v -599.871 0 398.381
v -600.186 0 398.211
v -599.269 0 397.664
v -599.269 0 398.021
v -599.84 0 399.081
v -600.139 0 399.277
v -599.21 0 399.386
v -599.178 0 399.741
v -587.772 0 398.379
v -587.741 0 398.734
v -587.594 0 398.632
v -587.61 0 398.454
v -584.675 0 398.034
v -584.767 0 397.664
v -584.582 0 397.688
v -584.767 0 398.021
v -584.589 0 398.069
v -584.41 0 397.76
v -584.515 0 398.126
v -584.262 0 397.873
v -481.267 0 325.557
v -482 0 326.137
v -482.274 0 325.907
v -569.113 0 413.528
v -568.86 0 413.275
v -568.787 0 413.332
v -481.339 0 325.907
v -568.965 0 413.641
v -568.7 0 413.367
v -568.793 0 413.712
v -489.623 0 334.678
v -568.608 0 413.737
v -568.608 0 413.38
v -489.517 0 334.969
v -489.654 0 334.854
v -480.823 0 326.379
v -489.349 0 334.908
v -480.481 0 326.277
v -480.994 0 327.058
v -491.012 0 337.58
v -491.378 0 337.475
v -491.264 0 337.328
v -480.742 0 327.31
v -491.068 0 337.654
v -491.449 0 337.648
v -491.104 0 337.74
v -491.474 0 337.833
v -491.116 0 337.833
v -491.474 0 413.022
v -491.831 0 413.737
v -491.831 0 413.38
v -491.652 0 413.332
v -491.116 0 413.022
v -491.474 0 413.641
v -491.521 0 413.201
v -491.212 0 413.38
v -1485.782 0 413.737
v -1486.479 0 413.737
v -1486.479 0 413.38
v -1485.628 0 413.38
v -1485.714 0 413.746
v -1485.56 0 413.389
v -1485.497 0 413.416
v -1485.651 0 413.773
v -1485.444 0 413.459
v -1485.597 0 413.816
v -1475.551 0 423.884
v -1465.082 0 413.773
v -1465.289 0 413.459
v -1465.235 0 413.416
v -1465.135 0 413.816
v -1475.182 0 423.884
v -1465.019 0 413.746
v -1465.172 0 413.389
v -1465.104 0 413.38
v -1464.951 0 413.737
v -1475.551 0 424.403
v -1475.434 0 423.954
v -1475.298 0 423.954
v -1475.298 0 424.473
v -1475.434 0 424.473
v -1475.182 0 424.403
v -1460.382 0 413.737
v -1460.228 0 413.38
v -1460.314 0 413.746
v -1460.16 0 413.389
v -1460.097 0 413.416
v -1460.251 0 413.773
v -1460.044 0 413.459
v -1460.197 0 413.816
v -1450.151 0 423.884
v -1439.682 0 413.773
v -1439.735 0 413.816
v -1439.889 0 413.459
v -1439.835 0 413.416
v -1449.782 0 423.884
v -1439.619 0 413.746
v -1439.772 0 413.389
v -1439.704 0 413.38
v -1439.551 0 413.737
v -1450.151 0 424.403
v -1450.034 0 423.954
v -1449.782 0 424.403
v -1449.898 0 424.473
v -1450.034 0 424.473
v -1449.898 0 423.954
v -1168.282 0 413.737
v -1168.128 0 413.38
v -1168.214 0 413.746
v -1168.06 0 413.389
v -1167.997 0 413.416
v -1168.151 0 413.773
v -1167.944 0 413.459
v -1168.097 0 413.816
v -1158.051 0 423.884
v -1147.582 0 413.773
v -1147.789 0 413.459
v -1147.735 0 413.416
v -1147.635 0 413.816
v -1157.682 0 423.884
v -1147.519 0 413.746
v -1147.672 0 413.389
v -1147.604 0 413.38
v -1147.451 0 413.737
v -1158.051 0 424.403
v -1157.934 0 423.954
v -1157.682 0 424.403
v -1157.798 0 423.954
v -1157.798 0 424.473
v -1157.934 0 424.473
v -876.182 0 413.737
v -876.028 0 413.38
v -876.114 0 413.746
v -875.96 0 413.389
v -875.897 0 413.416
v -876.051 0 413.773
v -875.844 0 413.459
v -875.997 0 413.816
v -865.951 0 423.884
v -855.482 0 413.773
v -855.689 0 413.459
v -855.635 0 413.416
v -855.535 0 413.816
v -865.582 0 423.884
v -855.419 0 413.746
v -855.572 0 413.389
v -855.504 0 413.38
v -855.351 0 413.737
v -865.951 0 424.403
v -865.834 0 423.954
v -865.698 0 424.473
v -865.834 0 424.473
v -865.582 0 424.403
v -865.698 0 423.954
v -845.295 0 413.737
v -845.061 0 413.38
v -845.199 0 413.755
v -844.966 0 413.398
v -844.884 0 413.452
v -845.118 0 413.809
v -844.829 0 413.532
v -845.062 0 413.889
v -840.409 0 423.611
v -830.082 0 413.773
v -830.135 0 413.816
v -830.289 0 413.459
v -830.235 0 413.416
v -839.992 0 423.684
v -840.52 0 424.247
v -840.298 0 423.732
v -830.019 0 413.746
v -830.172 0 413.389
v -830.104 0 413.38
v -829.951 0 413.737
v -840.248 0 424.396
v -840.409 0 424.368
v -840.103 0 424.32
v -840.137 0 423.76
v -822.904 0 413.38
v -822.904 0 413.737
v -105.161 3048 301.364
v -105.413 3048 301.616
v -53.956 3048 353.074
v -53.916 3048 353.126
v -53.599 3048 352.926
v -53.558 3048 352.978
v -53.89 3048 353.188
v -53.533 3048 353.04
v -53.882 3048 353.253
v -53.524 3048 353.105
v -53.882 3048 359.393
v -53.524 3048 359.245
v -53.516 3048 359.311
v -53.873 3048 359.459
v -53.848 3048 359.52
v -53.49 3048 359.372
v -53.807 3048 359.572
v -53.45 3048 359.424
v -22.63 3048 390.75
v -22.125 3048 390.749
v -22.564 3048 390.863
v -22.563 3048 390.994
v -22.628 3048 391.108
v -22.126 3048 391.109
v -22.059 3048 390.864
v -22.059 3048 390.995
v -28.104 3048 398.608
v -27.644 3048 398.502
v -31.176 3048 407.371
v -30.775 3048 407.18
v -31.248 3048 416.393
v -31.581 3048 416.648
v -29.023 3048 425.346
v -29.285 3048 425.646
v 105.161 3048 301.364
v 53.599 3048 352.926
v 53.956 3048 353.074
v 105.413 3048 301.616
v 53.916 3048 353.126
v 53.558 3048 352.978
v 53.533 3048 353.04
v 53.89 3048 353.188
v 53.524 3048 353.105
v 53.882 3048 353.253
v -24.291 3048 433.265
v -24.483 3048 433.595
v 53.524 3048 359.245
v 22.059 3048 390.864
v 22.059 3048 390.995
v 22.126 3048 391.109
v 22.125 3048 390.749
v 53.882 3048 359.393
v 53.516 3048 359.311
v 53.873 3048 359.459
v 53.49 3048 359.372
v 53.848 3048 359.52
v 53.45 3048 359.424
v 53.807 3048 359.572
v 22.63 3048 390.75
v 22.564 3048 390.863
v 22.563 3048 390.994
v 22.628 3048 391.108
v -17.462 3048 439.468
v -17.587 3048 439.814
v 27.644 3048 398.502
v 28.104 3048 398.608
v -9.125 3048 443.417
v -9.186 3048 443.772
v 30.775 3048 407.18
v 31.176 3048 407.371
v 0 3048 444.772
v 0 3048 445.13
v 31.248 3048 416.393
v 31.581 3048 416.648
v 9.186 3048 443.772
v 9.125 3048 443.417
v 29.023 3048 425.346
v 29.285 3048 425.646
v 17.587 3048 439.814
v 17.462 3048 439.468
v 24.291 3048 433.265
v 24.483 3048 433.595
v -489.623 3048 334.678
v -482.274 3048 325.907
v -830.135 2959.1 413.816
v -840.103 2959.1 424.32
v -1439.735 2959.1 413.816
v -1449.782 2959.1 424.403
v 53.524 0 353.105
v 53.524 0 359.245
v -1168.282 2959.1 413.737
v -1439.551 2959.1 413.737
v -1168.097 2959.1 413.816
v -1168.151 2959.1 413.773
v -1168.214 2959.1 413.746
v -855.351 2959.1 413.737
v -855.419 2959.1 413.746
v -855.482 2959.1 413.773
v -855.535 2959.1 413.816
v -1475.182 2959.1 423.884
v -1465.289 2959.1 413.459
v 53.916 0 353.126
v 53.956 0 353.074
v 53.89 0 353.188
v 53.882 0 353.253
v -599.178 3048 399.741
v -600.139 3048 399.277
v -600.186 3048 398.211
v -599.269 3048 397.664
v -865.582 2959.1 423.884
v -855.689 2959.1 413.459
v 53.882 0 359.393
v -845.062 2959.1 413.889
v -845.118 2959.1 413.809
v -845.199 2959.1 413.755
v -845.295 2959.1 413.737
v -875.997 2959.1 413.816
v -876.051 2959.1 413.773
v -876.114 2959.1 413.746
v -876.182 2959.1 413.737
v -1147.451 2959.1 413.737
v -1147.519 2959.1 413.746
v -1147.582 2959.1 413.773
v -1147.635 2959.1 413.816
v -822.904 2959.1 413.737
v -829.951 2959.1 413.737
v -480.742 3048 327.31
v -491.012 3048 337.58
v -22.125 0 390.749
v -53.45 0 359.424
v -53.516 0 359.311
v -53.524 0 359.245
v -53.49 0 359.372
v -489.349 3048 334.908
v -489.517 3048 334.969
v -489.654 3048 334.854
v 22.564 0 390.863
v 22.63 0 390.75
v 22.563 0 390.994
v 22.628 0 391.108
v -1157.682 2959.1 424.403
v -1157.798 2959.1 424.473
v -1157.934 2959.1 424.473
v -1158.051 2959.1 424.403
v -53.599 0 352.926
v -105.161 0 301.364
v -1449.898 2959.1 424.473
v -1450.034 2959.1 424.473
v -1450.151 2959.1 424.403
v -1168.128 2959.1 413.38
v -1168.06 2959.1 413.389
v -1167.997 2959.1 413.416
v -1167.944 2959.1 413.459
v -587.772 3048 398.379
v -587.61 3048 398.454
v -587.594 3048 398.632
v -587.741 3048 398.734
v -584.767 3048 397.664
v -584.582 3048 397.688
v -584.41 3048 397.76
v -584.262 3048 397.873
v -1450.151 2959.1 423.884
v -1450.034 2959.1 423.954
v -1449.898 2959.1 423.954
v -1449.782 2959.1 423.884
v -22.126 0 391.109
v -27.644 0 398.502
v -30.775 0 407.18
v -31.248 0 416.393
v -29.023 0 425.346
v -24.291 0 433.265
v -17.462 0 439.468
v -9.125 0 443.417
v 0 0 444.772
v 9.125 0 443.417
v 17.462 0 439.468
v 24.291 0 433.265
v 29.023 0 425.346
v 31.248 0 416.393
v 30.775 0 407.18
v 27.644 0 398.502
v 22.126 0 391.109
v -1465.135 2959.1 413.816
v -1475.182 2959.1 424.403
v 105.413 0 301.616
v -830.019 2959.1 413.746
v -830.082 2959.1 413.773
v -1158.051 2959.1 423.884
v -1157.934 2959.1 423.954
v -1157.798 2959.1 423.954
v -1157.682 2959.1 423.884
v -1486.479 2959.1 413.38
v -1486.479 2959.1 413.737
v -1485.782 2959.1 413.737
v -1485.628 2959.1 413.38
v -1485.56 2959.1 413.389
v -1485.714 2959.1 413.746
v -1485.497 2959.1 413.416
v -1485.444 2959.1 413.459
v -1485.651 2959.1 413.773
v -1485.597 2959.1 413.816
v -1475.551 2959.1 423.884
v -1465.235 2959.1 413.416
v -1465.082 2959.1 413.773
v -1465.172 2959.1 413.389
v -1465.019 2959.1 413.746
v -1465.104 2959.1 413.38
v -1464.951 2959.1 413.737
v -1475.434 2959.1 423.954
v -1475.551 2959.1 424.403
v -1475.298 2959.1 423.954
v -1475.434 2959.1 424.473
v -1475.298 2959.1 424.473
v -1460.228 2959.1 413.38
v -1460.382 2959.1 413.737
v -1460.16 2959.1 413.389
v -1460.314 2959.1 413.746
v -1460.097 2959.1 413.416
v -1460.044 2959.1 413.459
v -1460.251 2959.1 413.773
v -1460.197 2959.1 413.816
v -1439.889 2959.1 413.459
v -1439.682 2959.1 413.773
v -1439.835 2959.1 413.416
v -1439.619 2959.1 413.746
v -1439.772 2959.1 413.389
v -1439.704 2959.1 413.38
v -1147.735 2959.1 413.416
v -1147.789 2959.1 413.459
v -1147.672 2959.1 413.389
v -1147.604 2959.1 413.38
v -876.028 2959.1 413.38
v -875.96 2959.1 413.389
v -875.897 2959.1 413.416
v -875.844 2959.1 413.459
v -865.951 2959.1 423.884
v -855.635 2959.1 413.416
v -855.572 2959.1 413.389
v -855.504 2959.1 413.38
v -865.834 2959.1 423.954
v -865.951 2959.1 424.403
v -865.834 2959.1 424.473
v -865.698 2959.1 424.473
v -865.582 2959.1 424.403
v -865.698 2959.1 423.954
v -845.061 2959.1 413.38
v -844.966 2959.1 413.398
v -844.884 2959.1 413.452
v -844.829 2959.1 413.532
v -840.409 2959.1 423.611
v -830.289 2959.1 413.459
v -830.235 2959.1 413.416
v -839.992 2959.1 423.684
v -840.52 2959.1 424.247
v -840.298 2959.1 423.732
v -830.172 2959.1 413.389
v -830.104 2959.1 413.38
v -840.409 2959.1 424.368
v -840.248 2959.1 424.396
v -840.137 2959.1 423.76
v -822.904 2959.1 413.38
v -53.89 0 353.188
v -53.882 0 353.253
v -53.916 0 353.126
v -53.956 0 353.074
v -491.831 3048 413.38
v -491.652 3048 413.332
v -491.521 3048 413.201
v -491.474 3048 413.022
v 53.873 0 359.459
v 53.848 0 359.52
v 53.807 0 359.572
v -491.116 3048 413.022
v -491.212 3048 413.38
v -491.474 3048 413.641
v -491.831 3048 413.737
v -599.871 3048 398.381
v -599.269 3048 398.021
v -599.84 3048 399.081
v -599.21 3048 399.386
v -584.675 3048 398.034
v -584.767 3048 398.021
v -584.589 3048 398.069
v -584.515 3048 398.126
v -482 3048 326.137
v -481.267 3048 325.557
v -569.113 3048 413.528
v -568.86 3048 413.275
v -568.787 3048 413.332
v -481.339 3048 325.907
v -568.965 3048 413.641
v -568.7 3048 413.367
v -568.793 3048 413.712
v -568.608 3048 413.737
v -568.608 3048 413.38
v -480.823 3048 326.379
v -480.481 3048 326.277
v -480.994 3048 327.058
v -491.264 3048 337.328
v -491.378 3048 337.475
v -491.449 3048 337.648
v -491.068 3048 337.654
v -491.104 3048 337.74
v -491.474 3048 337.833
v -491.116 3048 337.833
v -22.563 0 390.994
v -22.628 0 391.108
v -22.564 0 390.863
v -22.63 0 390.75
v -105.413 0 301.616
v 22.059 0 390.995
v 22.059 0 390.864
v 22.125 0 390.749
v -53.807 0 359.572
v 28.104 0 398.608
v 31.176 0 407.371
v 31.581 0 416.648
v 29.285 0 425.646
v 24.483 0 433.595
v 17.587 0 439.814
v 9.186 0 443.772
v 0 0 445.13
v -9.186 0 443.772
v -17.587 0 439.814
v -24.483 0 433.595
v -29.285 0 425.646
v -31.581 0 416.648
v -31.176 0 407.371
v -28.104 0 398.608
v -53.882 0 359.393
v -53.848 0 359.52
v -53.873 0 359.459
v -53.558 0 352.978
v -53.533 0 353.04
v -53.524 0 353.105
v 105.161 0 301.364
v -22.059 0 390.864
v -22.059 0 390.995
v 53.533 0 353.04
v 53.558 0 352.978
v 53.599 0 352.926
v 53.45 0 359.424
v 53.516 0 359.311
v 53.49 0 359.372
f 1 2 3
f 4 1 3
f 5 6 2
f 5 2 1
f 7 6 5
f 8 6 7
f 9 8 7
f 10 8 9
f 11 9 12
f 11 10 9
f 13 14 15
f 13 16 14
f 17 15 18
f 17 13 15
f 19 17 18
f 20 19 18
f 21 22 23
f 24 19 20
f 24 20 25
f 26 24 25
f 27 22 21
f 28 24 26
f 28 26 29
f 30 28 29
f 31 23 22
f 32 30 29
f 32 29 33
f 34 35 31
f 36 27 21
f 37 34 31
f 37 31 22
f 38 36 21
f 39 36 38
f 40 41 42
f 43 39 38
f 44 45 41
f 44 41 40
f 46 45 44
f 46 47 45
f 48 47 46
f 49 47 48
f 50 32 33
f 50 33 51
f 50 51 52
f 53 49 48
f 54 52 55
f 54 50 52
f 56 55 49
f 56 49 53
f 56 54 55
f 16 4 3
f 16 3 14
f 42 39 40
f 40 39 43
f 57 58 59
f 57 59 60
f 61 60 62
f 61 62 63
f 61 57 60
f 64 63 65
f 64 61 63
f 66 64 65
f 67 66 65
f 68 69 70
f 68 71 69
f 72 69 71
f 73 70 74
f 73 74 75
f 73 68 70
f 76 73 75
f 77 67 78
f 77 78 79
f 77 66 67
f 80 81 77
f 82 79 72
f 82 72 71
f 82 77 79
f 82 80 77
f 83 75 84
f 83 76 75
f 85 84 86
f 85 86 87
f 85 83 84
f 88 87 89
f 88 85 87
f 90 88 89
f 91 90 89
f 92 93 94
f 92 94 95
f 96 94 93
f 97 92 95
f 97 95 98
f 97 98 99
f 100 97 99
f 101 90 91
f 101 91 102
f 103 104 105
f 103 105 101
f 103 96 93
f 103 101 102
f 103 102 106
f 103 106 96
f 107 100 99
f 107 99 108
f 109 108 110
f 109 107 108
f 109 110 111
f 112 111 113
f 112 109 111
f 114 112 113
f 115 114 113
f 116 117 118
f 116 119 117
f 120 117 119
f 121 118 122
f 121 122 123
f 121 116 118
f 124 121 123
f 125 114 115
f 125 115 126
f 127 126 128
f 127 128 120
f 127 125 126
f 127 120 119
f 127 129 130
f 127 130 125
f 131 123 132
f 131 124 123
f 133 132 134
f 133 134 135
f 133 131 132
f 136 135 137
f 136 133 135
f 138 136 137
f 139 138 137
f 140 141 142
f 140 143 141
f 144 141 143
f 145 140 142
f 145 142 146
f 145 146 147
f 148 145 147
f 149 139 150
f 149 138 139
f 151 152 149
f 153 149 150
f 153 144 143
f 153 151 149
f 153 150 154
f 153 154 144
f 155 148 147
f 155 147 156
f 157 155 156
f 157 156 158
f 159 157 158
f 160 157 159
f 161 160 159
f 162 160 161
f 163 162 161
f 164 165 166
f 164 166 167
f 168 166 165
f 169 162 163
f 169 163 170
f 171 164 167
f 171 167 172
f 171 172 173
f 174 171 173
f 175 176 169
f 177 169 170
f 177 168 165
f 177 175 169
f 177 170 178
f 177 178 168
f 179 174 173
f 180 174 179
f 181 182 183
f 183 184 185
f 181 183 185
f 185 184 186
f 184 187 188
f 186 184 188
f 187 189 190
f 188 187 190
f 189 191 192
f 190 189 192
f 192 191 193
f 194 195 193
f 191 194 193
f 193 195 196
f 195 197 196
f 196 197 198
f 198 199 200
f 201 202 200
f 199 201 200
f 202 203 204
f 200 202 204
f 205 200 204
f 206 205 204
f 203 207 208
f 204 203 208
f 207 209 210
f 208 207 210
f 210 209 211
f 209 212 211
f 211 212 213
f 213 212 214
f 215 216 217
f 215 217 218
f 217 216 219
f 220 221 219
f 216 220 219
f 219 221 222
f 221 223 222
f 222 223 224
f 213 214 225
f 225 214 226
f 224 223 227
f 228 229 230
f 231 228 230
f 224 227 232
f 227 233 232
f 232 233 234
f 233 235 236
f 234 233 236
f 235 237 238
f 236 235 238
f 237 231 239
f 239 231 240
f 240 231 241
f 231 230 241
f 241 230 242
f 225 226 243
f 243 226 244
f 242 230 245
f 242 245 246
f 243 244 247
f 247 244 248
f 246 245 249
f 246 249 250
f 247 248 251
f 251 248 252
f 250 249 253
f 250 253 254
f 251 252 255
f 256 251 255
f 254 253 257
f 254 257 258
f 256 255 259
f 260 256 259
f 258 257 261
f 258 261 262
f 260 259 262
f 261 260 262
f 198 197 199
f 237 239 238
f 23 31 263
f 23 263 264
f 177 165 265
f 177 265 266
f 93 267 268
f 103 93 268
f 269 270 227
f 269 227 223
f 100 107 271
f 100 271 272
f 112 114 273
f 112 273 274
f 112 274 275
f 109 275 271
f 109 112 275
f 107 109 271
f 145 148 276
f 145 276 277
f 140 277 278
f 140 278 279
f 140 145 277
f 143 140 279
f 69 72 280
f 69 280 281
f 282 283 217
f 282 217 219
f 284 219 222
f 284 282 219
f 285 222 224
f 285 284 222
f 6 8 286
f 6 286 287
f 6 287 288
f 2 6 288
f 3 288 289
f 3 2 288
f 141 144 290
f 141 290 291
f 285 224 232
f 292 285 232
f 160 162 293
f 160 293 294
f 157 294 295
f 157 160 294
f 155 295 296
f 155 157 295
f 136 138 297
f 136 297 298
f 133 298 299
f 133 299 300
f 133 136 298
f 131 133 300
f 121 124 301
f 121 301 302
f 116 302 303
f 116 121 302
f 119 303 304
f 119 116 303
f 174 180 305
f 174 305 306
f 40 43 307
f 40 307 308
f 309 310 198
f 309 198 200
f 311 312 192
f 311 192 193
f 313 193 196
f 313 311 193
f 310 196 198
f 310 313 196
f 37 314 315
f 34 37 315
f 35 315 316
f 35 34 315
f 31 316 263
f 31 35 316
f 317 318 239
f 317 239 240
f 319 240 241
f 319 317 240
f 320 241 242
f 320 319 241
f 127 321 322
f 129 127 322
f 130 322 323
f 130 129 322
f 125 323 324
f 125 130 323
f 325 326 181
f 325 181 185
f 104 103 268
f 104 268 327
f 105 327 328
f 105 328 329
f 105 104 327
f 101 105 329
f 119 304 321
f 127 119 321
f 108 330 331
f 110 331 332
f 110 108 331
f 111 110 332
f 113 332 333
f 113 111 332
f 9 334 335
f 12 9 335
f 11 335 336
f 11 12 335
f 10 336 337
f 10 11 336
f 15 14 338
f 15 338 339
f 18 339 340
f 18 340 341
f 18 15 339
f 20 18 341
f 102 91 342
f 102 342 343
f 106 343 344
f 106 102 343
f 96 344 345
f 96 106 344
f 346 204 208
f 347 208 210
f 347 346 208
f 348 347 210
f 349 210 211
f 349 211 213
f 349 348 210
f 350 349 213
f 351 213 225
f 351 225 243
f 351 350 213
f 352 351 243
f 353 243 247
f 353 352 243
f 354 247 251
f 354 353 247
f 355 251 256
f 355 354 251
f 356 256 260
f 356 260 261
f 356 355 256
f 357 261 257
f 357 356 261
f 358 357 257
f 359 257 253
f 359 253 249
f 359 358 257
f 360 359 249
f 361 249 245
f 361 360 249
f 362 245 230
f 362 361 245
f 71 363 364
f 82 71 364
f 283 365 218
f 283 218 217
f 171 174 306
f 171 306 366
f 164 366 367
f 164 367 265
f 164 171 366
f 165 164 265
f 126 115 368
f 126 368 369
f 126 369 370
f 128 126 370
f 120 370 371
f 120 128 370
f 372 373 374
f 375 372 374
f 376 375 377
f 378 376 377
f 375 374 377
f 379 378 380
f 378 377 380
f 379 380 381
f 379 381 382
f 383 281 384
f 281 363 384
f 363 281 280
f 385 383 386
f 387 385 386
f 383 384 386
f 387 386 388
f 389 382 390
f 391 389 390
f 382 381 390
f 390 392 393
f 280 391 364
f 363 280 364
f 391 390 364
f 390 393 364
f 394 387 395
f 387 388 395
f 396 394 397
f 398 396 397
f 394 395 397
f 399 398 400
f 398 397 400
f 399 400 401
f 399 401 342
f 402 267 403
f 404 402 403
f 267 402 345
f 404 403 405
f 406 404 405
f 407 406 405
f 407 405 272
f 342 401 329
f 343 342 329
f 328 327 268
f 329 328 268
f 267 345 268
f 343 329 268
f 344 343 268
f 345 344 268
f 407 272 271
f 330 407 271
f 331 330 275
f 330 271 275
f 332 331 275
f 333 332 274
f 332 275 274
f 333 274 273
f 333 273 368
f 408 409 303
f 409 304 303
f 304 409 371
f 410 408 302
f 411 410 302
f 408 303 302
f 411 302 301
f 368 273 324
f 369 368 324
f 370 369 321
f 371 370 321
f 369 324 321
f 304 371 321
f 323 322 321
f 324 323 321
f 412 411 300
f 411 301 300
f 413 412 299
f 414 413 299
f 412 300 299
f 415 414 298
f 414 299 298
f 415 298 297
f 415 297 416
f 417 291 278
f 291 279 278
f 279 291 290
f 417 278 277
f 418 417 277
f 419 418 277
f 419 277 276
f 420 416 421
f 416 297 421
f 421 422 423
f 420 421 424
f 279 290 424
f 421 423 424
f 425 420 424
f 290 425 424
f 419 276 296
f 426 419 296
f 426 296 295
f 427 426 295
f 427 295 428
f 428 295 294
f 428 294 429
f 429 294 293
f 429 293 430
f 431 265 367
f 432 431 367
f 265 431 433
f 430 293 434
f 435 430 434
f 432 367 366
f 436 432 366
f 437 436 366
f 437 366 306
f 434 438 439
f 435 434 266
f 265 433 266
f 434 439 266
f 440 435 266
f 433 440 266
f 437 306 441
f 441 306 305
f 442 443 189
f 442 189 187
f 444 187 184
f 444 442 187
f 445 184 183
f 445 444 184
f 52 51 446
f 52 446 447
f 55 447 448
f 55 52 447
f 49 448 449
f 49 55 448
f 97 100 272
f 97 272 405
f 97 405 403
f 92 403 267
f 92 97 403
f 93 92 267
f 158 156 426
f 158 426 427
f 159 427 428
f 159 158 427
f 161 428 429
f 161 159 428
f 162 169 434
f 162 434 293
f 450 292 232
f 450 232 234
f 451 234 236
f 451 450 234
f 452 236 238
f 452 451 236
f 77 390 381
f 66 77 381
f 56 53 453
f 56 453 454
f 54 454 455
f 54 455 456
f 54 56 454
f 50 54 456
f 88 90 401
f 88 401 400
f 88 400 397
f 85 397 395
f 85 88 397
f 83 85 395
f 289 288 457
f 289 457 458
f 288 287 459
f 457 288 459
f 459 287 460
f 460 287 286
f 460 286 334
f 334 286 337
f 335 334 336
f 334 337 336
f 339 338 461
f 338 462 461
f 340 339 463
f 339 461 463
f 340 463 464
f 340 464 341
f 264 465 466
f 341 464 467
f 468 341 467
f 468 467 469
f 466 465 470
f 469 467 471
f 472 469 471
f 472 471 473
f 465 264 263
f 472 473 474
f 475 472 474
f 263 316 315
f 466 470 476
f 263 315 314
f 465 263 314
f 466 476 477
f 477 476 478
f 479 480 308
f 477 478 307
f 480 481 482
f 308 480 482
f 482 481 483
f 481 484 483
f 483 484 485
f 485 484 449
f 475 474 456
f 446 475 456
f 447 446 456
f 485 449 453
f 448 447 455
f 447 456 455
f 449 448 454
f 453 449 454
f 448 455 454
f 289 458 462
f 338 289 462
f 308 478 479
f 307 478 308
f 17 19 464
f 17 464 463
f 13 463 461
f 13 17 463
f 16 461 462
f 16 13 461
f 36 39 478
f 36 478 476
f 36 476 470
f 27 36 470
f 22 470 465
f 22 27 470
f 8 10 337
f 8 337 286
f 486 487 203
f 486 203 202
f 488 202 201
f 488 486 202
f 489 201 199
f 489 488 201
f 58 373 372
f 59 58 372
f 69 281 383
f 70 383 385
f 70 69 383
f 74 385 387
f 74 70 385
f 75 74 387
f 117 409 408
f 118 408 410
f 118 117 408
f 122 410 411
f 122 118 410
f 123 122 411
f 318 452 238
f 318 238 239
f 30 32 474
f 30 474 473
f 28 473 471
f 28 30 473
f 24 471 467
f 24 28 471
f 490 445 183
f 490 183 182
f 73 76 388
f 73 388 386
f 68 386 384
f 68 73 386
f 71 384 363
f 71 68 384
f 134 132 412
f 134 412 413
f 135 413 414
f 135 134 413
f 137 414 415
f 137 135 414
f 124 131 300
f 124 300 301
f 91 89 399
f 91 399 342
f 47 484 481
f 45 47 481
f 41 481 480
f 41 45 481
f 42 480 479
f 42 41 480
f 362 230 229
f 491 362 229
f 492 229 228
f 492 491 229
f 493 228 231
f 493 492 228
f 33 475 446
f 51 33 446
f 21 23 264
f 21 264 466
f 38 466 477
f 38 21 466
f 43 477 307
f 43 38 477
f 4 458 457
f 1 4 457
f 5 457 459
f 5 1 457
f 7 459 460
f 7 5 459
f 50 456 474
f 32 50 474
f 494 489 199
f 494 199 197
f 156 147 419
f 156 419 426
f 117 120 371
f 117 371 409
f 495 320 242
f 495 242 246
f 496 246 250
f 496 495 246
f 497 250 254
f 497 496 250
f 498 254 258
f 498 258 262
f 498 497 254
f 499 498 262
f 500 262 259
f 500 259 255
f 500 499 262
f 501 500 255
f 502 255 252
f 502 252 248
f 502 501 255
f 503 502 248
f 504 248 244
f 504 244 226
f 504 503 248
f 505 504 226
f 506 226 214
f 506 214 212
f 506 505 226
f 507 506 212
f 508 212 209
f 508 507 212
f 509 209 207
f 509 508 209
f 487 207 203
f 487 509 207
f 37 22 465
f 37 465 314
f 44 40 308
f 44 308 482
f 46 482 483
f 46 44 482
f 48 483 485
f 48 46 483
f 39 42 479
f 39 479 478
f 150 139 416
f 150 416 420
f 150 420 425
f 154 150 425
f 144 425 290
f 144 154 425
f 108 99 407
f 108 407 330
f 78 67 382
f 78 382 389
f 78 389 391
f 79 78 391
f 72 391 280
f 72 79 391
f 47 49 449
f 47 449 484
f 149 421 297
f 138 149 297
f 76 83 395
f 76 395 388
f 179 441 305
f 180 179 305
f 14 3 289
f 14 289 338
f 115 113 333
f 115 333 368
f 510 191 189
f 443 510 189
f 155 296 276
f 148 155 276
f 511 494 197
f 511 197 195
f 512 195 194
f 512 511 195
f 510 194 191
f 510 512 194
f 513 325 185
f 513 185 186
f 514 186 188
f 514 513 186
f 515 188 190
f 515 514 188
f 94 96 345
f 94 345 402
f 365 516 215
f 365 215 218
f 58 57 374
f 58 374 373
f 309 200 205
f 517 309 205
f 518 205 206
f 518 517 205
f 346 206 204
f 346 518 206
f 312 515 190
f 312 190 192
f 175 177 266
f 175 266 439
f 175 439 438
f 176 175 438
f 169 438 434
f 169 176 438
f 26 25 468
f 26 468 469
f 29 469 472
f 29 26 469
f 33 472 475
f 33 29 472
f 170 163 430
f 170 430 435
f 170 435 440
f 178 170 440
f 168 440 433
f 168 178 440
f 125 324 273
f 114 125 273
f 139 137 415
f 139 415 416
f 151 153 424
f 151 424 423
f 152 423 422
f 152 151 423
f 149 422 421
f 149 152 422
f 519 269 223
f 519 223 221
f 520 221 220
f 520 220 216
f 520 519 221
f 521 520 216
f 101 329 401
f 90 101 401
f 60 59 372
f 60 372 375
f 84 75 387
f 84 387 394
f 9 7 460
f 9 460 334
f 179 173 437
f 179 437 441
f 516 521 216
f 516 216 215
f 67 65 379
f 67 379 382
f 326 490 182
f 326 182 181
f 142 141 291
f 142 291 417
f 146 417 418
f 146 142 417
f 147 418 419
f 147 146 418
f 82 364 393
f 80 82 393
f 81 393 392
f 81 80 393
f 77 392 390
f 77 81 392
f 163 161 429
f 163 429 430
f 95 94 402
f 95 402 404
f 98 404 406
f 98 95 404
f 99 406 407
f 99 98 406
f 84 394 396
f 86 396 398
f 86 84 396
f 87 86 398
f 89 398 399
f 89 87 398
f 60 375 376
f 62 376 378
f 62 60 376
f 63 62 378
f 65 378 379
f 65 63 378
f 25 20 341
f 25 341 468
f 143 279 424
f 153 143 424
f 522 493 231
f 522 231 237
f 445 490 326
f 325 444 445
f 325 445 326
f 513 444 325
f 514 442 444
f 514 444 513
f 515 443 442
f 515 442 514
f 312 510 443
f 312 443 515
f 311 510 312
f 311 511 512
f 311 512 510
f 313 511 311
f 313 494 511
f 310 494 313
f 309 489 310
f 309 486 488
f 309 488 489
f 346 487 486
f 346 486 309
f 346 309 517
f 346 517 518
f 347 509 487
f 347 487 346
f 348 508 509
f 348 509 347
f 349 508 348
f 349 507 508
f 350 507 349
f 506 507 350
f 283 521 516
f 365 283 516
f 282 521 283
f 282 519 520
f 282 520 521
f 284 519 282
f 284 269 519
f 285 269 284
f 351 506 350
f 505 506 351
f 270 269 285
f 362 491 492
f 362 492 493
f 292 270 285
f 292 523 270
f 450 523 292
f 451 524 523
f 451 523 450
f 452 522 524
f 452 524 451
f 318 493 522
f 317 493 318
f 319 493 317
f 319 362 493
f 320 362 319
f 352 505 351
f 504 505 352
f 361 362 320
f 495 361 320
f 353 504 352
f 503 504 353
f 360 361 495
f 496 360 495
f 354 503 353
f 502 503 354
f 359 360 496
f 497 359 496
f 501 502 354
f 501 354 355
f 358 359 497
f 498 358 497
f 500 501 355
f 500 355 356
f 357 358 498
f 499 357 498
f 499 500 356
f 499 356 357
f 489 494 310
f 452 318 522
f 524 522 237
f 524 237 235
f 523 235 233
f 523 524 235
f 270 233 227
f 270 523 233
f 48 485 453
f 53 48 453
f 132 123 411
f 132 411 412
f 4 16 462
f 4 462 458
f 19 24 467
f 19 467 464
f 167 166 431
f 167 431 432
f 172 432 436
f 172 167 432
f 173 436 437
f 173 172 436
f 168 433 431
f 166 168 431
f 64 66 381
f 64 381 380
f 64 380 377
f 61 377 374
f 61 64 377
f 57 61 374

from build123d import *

# Parameters (mm, degrees)
F1_DEPTH = 2959.1
F2_DEPTH = 3048
F3_DEPTH = 3048


with BuildPart() as f1:
    # F0 (on Front) → F1 (new body)
    with BuildSketch(Plane.XZ):
        with BuildLine():
            Line((-1475.550572, 424.403133), (-1485.597445, 413.815938))
            ThreePointArc((-1485.597445, 413.815938), (-1485.681425, 413.757407), (-1485.78169, 413.73678))
            Line((-1485.78169, 413.73678), (-1486.478827, 413.73678))
            Line((-1486.478827, 413.73678), (-1486.478827, 413.37958))
            Line((-1486.478827, 413.37958), (-1485.628242, 413.37958))
            ThreePointArc((-1485.628242, 413.37958), (-1485.527978, 413.400207), (-1485.443997, 413.458738))
            Line((-1485.443997, 413.458738), (-1475.550572, 423.884232))
            ThreePointArc((-1475.550572, 423.884232), (-1475.366327, 423.96339), (-1475.182082, 423.884232))
            Line((-1475.182082, 423.884232), (-1465.288657, 413.458738))
            ThreePointArc((-1465.288657, 413.458738), (-1465.204677, 413.400207), (-1465.104412, 413.37958))
            Line((-1465.104412, 413.37958), (-1460.228242, 413.37958))
            ThreePointArc((-1460.228242, 413.37958), (-1460.127978, 413.400207), (-1460.043997, 413.458738))
            Line((-1460.043997, 413.458738), (-1450.150572, 423.884232))
            ThreePointArc((-1450.150572, 423.884232), (-1449.966327, 423.96339), (-1449.782082, 423.884232))
            Line((-1449.782082, 423.884232), (-1439.888657, 413.458738))
            ThreePointArc((-1439.888657, 413.458738), (-1439.804677, 413.400207), (-1439.704412, 413.37958))
            Line((-1439.704412, 413.37958), (-1168.128242, 413.37958))
            ThreePointArc((-1168.128242, 413.37958), (-1168.027978, 413.400207), (-1167.943997, 413.458738))
            Line((-1167.943997, 413.458738), (-1158.050572, 423.884232))
            ThreePointArc((-1158.050572, 423.884232), (-1157.866327, 423.96339), (-1157.682082, 423.884232))
            Line((-1157.682082, 423.884232), (-1147.788657, 413.458738))
            ThreePointArc((-1147.788657, 413.458738), (-1147.704677, 413.400207), (-1147.604412, 413.37958))
            Line((-1147.604412, 413.37958), (-876.028242, 413.37958))
            ThreePointArc((-876.028242, 413.37958), (-875.927978, 413.400207), (-875.843997, 413.458738))
            Line((-875.843997, 413.458738), (-865.950572, 423.884232))
            ThreePointArc((-865.950572, 423.884232), (-865.766327, 423.96339), (-865.582082, 423.884232))
            Line((-865.582082, 423.884232), (-855.688657, 413.458738))
            ThreePointArc((-855.688657, 413.458738), (-855.604677, 413.400207), (-855.504412, 413.37958))
            Line((-855.504412, 413.37958), (-845.061409, 413.37958))
            ThreePointArc((-845.061409, 413.37958), (-844.922473, 413.420947), (-844.828792, 413.531574))
            Line((-844.828792, 413.531574), (-840.408798, 423.611024))
            ThreePointArc((-840.408798, 423.611024), (-840.219898, 423.759227), (-839.991935, 423.683859))
            Line((-839.991935, 423.683859), (-830.288657, 413.458738))
            ThreePointArc((-830.288657, 413.458738), (-830.204677, 413.400207), (-830.104412, 413.37958))
            Line((-830.104412, 413.37958), (-822.903827, 413.37958))
            Line((-822.903827, 413.37958), (-822.903827, 413.73678))
            Line((-822.903827, 413.73678), (-829.950964, 413.73678))
            ThreePointArc((-829.950964, 413.73678), (-830.051229, 413.757407), (-830.135209, 413.815938))
            Line((-830.135209, 413.815938), (-840.10306, 424.319861))
            ThreePointArc((-840.10306, 424.319861), (-840.331023, 424.395228), (-840.519922, 424.247025))
            Line((-840.519922, 424.247025), (-845.062176, 413.888774))
            ThreePointArc((-845.062176, 413.888774), (-845.155857, 413.778147), (-845.294793, 413.73678))
            Line((-845.294793, 413.73678), (-855.350964, 413.73678))
            ThreePointArc((-855.350964, 413.73678), (-855.451229, 413.757407), (-855.535209, 413.815938))
            Line((-855.535209, 413.815938), (-865.582082, 424.403133))
            ThreePointArc((-865.582082, 424.403133), (-865.766327, 424.482291), (-865.950572, 424.403133))
            Line((-865.950572, 424.403133), (-875.997445, 413.815938))
            ThreePointArc((-875.997445, 413.815938), (-876.081425, 413.757407), (-876.18169, 413.73678))
            Line((-876.18169, 413.73678), (-1147.450964, 413.73678))
            ThreePointArc((-1147.450964, 413.73678), (-1147.551229, 413.757407), (-1147.635209, 413.815938))
            Line((-1147.635209, 413.815938), (-1157.682082, 424.403133))
            ThreePointArc((-1157.682082, 424.403133), (-1157.866327, 424.482291), (-1158.050572, 424.403133))
            Line((-1158.050572, 424.403133), (-1168.097445, 413.815938))
            ThreePointArc((-1168.097445, 413.815938), (-1168.181425, 413.757407), (-1168.28169, 413.73678))
            Line((-1168.28169, 413.73678), (-1439.550964, 413.73678))
            ThreePointArc((-1439.550964, 413.73678), (-1439.651229, 413.757407), (-1439.735209, 413.815938))
            Line((-1439.735209, 413.815938), (-1449.782082, 424.403133))
            ThreePointArc((-1449.782082, 424.403133), (-1449.966327, 424.482291), (-1450.150572, 424.403133))
            Line((-1450.150572, 424.403133), (-1460.197445, 413.815938))
            ThreePointArc((-1460.197445, 413.815938), (-1460.281425, 413.757407), (-1460.38169, 413.73678))
            Line((-1460.38169, 413.73678), (-1464.950964, 413.73678))
            ThreePointArc((-1464.950964, 413.73678), (-1465.051229, 413.757407), (-1465.135209, 413.815938))
            Line((-1465.135209, 413.815938), (-1475.182082, 424.403133))
            ThreePointArc((-1475.182082, 424.403133), (-1475.366327, 424.482291), (-1475.550572, 424.403133))
        make_face()
    extrude(amount=-F1_DEPTH)


with BuildPart() as f2:
    # F0 (on Front) → F2 (new body)
    with BuildSketch(Plane.XZ):
        with BuildLine():
            ThreePointArc((22.629533, 390.750047), (22.55514, 390.928644), (22.628113, 391.107826))
            ThreePointArc((22.628113, 391.107826), (0, 445.12958), (-22.628113, 391.107826))
            ThreePointArc((-22.628113, 391.107826), (-22.55514, 390.928644), (-22.629533, 390.750047))
            Line((-22.629533, 390.750047), (-53.807142, 359.572438))
            ThreePointArc((-53.807142, 359.572438), (-53.862202, 359.490034), (-53.881537, 359.392833))
            Line((-53.881537, 359.392833), (-53.881537, 353.253253))
            ThreePointArc((-53.881537, 353.253253), (-53.900871, 353.156052), (-53.955932, 353.073648))
            Line((-53.955932, 353.073648), (-105.413388, 301.616192))
            Line((-105.413388, 301.616192), (-105.160809, 301.363613))
            Line((-105.160809, 301.363613), (-53.598731, 352.925691))
            ThreePointArc((-53.598731, 352.925691), (-53.543671, 353.008095), (-53.524337, 353.105296))
            Line((-53.524337, 353.105296), (-53.524337, 359.244876))
            ThreePointArc((-53.524337, 359.244876), (-53.505002, 359.342077), (-53.449942, 359.424481))
            Line((-53.449942, 359.424481), (-22.124969, 390.749453))
            ThreePointArc((-22.124969, 390.749453), (-22.050575, 390.929473), (-22.125556, 391.109248))
            ThreePointArc((-22.125556, 391.109248), (0, 444.77238), (22.125556, 391.109248))
            ThreePointArc((22.125556, 391.109248), (22.050575, 390.929473), (22.124969, 390.749453))
            Line((22.124969, 390.749453), (53.449942, 359.424481))
            ThreePointArc((53.449942, 359.424481), (53.505002, 359.342077), (53.524337, 359.244876))
            Line((53.524337, 359.244876), (53.524337, 353.105296))
            ThreePointArc((53.524337, 353.105296), (53.543671, 353.008095), (53.598731, 352.925691))
            Line((53.598731, 352.925691), (105.160809, 301.363613))
            Line((105.160809, 301.363613), (105.413388, 301.616192))
            Line((105.413388, 301.616192), (53.955932, 353.073648))
            ThreePointArc((53.955932, 353.073648), (53.900871, 353.156052), (53.881537, 353.253253))
            Line((53.881537, 353.253253), (53.881537, 359.392833))
            ThreePointArc((53.881537, 359.392833), (53.862202, 359.490034), (53.807142, 359.572438))
            Line((53.807142, 359.572438), (22.629533, 390.750047))
        make_face()
    extrude(amount=-F2_DEPTH)


with BuildPart() as f3:
    # F0 (on Front) → F3 (new body)
    with BuildSketch(Plane.XZ):
        with BuildLine():
            Line((-491.830728, 413.73678), (-568.607913, 413.73678))
            ThreePointArc((-568.607913, 413.73678), (-568.881302, 413.682399), (-569.11307, 413.527537))
            Line((-569.11307, 413.527537), (-584.514654, 398.125953))
            ThreePointArc((-584.514654, 398.125953), (-584.630538, 398.048522), (-584.767233, 398.021332))
            Line((-584.767233, 398.021332), (-599.269481, 398.021332))
            ThreePointArc((-599.269481, 398.021332), (-599.952251, 398.73476), (-599.20954, 399.385556))
            Line((-599.20954, 399.385556), (-587.772013, 398.378532))
            ThreePointArc((-587.772013, 398.378532), (-587.578437, 398.540779), (-587.740684, 398.734356))
            Line((-587.740684, 398.734356), (-599.178211, 399.74138))
            ThreePointArc((-599.178211, 399.74138), (-600.309107, 398.75044), (-599.269481, 397.664132))
            Line((-599.269481, 397.664132), (-584.767233, 397.664132))
            ThreePointArc((-584.767233, 397.664132), (-584.493844, 397.718512), (-584.262075, 397.873375))
            Line((-584.262075, 397.873375), (-568.860492, 413.274958))
            ThreePointArc((-568.860492, 413.274958), (-568.744608, 413.35239), (-568.607913, 413.37958))
            Line((-568.607913, 413.37958), (-491.830728, 413.37958))
            ThreePointArc((-491.830728, 413.37958), (-491.578149, 413.274958), (-491.473528, 413.02238))
            Line((-491.473528, 413.02238), (-491.473528, 337.832694))
            ThreePointArc((-491.473528, 337.832694), (-491.419147, 337.559305), (-491.264285, 337.327537))
            Line((-491.264285, 337.327537), (-480.994399, 327.057651))
            ThreePointArc((-480.994399, 327.057651), (-481.016073, 326.071887), (-481.999932, 326.136866))
            Line((-481.999932, 326.136866), (-489.34947, 334.907565))
            ThreePointArc((-489.34947, 334.907565), (-489.60111, 334.929715), (-489.623191, 334.678069))
            Line((-489.623191, 334.678069), (-482.273749, 325.907484))
            ThreePointArc((-482.273749, 325.907484), (-480.774802, 325.808485), (-480.741781, 327.310335))
            Line((-480.741781, 327.310335), (-491.011706, 337.580259))
            ThreePointArc((-491.011706, 337.580259), (-491.089137, 337.696143), (-491.116327, 337.832838))
            Line((-491.116327, 337.832838), (-491.116327, 413.02238))
            ThreePointArc((-491.116327, 413.02238), (-491.32557, 413.527537), (-491.830728, 413.73678))
        make_face()
    extrude(amount=-F3_DEPTH)


solid = Compound([f1.part, f2.part, f3.part])
